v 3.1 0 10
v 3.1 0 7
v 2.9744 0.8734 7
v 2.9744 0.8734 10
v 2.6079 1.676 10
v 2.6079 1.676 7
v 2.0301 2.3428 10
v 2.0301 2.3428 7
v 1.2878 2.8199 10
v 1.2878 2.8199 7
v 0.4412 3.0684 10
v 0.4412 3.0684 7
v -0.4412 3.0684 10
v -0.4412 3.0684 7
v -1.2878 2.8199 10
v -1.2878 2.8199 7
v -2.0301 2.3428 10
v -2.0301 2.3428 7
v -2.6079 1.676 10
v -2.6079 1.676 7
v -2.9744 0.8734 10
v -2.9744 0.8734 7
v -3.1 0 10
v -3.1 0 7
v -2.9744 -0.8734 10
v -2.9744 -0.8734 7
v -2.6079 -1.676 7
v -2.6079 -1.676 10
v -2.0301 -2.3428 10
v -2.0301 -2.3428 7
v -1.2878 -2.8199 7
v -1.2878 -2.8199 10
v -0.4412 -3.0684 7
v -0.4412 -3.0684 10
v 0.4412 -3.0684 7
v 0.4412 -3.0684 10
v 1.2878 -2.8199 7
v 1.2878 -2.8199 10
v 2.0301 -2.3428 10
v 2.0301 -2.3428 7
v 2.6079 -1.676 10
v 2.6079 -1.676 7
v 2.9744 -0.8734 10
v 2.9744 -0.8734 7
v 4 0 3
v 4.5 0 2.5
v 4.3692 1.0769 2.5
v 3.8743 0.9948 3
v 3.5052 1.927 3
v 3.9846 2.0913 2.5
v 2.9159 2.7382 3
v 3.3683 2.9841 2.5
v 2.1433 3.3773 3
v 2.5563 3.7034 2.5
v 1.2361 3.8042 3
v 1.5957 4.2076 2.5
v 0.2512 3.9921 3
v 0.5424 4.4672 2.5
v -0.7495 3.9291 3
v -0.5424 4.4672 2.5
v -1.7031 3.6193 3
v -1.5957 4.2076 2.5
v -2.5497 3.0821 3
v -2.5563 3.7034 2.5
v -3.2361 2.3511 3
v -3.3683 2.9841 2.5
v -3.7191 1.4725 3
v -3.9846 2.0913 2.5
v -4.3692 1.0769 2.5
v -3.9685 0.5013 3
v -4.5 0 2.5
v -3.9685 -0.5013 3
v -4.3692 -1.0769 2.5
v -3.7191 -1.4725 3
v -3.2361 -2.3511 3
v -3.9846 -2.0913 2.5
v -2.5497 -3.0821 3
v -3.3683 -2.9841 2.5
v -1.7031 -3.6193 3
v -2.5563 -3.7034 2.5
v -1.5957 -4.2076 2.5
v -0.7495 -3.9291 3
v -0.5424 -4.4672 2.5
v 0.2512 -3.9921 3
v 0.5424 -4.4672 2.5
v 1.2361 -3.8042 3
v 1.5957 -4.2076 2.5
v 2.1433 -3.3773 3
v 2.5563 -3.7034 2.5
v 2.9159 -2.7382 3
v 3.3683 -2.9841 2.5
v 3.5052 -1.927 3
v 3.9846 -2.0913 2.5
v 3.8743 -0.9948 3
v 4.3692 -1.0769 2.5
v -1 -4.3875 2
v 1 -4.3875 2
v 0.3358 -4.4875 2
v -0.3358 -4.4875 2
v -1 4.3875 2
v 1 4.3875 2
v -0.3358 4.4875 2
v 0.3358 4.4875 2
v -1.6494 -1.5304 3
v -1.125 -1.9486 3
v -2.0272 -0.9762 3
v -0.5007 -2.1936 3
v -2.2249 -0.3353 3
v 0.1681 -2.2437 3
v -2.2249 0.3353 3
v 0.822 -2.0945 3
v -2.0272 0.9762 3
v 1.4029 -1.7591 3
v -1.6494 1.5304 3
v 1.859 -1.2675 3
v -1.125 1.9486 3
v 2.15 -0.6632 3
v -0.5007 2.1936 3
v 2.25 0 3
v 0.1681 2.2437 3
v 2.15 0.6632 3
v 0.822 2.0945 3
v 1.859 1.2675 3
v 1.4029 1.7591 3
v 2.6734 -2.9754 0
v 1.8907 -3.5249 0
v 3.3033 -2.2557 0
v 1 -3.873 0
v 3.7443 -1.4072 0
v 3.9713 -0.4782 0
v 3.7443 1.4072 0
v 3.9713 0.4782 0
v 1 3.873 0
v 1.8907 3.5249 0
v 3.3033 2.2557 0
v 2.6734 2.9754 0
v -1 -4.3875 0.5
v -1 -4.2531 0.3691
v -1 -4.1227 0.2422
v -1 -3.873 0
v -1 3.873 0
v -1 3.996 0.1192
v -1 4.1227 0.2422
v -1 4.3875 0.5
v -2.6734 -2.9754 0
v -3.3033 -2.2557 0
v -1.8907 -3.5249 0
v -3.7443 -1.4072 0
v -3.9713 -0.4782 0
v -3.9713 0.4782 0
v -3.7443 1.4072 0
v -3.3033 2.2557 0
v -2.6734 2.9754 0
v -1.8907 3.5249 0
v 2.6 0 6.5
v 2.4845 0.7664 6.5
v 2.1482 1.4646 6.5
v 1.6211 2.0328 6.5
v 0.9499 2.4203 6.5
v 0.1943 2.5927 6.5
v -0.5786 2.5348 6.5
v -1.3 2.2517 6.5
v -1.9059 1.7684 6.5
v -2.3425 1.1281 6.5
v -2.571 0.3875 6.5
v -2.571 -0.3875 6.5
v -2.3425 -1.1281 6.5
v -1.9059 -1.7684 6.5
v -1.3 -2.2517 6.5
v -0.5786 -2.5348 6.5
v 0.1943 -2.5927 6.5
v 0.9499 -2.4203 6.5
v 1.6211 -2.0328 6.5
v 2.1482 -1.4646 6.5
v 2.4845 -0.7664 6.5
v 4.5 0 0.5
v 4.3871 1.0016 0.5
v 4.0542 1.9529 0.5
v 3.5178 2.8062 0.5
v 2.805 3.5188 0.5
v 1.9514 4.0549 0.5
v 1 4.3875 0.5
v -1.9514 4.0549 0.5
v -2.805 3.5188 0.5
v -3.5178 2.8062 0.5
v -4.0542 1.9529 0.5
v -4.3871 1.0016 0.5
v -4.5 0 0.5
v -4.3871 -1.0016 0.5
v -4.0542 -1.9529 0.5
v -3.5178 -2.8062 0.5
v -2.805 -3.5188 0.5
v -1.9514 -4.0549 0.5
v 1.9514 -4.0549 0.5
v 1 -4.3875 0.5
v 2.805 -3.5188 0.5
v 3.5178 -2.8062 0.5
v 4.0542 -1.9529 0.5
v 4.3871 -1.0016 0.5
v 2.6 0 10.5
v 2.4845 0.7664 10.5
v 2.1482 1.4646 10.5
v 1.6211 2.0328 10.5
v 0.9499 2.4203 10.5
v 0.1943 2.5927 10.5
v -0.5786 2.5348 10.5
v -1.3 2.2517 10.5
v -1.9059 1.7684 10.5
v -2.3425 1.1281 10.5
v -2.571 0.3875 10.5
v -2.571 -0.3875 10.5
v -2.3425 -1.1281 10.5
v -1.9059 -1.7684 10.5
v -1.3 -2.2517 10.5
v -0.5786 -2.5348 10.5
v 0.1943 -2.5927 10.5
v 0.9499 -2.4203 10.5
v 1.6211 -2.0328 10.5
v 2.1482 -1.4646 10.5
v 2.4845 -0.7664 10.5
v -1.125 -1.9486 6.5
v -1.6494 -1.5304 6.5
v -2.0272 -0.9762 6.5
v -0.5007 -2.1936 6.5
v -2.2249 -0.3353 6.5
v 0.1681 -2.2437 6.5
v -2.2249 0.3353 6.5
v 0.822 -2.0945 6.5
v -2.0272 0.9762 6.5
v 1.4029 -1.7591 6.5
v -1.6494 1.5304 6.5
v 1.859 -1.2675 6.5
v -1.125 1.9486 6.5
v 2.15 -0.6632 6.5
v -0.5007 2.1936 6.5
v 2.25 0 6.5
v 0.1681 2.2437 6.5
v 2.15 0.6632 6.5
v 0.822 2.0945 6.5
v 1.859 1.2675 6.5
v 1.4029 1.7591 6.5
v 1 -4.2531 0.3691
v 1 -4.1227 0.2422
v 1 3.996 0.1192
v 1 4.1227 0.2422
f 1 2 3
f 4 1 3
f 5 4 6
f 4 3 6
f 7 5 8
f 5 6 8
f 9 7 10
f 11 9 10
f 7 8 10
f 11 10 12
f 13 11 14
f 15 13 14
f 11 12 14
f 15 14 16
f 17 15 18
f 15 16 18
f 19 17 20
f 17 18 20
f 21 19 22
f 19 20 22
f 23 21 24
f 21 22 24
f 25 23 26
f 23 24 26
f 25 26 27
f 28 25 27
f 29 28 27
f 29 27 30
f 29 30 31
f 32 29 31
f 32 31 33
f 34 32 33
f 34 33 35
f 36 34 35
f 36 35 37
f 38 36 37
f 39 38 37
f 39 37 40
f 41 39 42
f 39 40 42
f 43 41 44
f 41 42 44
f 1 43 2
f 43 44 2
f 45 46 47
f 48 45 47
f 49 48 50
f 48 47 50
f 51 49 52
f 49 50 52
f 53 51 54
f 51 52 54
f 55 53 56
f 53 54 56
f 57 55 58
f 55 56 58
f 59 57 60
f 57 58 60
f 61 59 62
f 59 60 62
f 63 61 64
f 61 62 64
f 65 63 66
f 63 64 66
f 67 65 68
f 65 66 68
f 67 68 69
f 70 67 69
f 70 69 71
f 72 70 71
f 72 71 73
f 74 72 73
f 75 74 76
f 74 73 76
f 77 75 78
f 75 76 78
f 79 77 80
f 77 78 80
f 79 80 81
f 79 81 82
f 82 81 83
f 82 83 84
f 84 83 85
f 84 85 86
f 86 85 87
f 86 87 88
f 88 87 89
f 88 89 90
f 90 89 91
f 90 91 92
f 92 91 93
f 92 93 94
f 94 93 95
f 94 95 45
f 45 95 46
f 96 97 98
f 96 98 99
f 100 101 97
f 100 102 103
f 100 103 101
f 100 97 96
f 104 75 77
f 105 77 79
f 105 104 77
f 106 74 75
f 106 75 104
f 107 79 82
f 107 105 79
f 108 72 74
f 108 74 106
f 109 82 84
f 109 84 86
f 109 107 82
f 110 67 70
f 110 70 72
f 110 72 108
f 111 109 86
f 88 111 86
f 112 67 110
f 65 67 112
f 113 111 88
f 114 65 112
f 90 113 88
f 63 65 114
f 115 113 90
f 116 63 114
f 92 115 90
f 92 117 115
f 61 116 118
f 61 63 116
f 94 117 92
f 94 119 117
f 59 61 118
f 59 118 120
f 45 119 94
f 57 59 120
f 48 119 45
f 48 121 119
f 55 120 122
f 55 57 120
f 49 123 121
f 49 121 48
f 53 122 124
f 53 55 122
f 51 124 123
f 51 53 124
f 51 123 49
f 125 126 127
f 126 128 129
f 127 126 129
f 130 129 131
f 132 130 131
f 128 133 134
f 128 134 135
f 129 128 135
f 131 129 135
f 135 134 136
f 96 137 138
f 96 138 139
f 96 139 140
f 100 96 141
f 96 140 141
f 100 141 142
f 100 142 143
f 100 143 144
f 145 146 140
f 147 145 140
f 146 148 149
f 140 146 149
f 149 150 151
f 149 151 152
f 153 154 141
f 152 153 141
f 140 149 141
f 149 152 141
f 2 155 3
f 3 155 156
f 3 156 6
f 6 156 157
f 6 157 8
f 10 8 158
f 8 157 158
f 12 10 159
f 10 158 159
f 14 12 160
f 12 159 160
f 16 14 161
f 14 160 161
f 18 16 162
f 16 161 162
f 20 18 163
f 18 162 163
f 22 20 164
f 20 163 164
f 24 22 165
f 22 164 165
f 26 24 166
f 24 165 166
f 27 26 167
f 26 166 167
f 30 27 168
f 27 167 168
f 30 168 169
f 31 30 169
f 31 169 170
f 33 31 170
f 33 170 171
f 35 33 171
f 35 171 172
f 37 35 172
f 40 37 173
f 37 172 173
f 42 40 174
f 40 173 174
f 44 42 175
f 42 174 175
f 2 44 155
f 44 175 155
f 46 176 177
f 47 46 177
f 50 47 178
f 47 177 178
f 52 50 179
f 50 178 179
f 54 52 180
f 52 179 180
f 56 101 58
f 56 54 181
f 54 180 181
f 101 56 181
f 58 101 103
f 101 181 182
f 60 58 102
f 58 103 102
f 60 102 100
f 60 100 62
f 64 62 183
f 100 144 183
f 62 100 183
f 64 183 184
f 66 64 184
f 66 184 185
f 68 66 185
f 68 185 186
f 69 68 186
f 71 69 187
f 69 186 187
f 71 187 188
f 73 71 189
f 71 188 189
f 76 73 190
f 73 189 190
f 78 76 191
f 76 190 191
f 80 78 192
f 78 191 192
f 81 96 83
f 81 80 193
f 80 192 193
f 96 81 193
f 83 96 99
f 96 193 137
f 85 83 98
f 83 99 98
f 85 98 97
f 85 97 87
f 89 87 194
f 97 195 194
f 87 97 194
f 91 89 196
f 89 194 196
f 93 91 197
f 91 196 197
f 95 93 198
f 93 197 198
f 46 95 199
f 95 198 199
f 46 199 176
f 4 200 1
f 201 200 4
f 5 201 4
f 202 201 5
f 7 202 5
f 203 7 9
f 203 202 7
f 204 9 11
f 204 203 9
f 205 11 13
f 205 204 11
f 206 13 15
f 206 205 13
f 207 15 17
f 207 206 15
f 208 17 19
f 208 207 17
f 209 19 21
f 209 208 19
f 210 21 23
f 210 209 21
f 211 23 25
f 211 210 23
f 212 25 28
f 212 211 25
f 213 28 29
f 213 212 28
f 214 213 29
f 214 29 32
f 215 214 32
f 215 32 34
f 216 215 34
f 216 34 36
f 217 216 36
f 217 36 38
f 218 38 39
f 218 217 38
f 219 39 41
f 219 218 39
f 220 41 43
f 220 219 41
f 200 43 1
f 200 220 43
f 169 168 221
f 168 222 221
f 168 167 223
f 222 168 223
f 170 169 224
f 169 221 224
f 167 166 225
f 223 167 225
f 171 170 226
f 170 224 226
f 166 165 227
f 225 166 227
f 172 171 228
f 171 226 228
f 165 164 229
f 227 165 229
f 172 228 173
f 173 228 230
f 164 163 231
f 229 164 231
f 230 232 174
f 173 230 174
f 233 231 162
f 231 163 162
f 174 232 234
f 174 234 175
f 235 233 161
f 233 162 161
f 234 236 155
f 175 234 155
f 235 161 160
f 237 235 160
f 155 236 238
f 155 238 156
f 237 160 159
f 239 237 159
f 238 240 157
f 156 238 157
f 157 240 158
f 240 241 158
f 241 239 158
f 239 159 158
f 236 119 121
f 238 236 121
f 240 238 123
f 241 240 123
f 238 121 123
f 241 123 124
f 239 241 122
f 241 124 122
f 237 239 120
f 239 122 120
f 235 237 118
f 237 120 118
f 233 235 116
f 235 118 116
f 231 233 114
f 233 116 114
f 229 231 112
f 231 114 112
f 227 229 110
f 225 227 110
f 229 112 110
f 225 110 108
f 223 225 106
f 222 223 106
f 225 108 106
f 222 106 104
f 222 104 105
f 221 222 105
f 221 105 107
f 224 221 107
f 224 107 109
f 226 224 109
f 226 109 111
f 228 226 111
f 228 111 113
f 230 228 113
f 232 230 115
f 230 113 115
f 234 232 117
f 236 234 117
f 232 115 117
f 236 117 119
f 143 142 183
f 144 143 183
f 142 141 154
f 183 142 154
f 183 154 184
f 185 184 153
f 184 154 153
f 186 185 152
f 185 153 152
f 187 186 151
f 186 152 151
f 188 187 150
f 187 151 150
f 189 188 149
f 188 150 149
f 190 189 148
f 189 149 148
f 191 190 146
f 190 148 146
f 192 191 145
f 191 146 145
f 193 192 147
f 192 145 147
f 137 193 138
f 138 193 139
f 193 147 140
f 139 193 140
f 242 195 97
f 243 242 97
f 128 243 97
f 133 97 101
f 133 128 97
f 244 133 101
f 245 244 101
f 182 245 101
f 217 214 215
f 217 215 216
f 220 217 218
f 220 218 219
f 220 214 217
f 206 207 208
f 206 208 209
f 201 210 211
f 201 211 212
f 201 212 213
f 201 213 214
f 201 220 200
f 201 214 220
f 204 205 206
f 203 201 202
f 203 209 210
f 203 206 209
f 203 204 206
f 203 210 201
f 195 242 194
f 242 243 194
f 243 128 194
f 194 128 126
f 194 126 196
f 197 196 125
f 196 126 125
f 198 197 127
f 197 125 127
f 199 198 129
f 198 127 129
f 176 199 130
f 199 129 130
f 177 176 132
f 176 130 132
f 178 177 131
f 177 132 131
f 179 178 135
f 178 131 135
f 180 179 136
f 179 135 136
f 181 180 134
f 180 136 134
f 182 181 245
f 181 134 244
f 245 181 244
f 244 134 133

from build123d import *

# Parameters (mm, degrees)
SKETCH_1_R          = 4.5
EXTRUDE_1_DEPTH     = 3
SKETCH_2_R          = 2.25
EXTRUDE_2_DEPTH     = 3.5
SKETCH_3_R          = 3.1
EXTRUDE_3_DEPTH     = 4
CHAMFER_1_SIZE      = 0.5
SKETCH_4_W          = 2
SKETCH_4_H          = 10.520514376
CUT_EXTRUDE_1_DEPTH = 2


with BuildPart() as part:
    # Эскиз1 → Бобышка-Вытянуть1 (new body)
    with BuildSketch(Plane.XY):
        Circle(SKETCH_1_R)
    extrude(amount=EXTRUDE_1_DEPTH)

    # Эскиз2 → Бобышка-Вытянуть2 (add)
    with BuildSketch(Plane.XY.offset(3)):
        Circle(SKETCH_2_R)
    extrude(amount=EXTRUDE_2_DEPTH)

    # Эскиз3 → Бобышка-Вытянуть3 (add)
    with BuildSketch(Plane.XY.offset(6.5)):
        Circle(SKETCH_3_R)
    extrude(amount=EXTRUDE_3_DEPTH)

    # Фаска1
    chamfer_1_edges = [part.edges().sort_by_distance(p)[0] for p in [
        (-4.5, 0, 0),
        (-4.5, 0, 3),
        (-3.1, 0, 6.5),
        (-3.1, 0, 10.5),
    ]]
    chamfer(chamfer_1_edges, length=CHAMFER_1_SIZE)

    # Эскиз4 → Вырез-Вытянуть1 (cut)
    with BuildSketch(Plane(origin=(0, 0, 0), x_dir=(-1, 0, 0), z_dir=(0, 0, -1))):
        Rectangle(SKETCH_4_W, SKETCH_4_H)
    extrude(amount=-CUT_EXTRUDE_1_DEPTH, mode=Mode.SUBTRACT)


solid = part.part
